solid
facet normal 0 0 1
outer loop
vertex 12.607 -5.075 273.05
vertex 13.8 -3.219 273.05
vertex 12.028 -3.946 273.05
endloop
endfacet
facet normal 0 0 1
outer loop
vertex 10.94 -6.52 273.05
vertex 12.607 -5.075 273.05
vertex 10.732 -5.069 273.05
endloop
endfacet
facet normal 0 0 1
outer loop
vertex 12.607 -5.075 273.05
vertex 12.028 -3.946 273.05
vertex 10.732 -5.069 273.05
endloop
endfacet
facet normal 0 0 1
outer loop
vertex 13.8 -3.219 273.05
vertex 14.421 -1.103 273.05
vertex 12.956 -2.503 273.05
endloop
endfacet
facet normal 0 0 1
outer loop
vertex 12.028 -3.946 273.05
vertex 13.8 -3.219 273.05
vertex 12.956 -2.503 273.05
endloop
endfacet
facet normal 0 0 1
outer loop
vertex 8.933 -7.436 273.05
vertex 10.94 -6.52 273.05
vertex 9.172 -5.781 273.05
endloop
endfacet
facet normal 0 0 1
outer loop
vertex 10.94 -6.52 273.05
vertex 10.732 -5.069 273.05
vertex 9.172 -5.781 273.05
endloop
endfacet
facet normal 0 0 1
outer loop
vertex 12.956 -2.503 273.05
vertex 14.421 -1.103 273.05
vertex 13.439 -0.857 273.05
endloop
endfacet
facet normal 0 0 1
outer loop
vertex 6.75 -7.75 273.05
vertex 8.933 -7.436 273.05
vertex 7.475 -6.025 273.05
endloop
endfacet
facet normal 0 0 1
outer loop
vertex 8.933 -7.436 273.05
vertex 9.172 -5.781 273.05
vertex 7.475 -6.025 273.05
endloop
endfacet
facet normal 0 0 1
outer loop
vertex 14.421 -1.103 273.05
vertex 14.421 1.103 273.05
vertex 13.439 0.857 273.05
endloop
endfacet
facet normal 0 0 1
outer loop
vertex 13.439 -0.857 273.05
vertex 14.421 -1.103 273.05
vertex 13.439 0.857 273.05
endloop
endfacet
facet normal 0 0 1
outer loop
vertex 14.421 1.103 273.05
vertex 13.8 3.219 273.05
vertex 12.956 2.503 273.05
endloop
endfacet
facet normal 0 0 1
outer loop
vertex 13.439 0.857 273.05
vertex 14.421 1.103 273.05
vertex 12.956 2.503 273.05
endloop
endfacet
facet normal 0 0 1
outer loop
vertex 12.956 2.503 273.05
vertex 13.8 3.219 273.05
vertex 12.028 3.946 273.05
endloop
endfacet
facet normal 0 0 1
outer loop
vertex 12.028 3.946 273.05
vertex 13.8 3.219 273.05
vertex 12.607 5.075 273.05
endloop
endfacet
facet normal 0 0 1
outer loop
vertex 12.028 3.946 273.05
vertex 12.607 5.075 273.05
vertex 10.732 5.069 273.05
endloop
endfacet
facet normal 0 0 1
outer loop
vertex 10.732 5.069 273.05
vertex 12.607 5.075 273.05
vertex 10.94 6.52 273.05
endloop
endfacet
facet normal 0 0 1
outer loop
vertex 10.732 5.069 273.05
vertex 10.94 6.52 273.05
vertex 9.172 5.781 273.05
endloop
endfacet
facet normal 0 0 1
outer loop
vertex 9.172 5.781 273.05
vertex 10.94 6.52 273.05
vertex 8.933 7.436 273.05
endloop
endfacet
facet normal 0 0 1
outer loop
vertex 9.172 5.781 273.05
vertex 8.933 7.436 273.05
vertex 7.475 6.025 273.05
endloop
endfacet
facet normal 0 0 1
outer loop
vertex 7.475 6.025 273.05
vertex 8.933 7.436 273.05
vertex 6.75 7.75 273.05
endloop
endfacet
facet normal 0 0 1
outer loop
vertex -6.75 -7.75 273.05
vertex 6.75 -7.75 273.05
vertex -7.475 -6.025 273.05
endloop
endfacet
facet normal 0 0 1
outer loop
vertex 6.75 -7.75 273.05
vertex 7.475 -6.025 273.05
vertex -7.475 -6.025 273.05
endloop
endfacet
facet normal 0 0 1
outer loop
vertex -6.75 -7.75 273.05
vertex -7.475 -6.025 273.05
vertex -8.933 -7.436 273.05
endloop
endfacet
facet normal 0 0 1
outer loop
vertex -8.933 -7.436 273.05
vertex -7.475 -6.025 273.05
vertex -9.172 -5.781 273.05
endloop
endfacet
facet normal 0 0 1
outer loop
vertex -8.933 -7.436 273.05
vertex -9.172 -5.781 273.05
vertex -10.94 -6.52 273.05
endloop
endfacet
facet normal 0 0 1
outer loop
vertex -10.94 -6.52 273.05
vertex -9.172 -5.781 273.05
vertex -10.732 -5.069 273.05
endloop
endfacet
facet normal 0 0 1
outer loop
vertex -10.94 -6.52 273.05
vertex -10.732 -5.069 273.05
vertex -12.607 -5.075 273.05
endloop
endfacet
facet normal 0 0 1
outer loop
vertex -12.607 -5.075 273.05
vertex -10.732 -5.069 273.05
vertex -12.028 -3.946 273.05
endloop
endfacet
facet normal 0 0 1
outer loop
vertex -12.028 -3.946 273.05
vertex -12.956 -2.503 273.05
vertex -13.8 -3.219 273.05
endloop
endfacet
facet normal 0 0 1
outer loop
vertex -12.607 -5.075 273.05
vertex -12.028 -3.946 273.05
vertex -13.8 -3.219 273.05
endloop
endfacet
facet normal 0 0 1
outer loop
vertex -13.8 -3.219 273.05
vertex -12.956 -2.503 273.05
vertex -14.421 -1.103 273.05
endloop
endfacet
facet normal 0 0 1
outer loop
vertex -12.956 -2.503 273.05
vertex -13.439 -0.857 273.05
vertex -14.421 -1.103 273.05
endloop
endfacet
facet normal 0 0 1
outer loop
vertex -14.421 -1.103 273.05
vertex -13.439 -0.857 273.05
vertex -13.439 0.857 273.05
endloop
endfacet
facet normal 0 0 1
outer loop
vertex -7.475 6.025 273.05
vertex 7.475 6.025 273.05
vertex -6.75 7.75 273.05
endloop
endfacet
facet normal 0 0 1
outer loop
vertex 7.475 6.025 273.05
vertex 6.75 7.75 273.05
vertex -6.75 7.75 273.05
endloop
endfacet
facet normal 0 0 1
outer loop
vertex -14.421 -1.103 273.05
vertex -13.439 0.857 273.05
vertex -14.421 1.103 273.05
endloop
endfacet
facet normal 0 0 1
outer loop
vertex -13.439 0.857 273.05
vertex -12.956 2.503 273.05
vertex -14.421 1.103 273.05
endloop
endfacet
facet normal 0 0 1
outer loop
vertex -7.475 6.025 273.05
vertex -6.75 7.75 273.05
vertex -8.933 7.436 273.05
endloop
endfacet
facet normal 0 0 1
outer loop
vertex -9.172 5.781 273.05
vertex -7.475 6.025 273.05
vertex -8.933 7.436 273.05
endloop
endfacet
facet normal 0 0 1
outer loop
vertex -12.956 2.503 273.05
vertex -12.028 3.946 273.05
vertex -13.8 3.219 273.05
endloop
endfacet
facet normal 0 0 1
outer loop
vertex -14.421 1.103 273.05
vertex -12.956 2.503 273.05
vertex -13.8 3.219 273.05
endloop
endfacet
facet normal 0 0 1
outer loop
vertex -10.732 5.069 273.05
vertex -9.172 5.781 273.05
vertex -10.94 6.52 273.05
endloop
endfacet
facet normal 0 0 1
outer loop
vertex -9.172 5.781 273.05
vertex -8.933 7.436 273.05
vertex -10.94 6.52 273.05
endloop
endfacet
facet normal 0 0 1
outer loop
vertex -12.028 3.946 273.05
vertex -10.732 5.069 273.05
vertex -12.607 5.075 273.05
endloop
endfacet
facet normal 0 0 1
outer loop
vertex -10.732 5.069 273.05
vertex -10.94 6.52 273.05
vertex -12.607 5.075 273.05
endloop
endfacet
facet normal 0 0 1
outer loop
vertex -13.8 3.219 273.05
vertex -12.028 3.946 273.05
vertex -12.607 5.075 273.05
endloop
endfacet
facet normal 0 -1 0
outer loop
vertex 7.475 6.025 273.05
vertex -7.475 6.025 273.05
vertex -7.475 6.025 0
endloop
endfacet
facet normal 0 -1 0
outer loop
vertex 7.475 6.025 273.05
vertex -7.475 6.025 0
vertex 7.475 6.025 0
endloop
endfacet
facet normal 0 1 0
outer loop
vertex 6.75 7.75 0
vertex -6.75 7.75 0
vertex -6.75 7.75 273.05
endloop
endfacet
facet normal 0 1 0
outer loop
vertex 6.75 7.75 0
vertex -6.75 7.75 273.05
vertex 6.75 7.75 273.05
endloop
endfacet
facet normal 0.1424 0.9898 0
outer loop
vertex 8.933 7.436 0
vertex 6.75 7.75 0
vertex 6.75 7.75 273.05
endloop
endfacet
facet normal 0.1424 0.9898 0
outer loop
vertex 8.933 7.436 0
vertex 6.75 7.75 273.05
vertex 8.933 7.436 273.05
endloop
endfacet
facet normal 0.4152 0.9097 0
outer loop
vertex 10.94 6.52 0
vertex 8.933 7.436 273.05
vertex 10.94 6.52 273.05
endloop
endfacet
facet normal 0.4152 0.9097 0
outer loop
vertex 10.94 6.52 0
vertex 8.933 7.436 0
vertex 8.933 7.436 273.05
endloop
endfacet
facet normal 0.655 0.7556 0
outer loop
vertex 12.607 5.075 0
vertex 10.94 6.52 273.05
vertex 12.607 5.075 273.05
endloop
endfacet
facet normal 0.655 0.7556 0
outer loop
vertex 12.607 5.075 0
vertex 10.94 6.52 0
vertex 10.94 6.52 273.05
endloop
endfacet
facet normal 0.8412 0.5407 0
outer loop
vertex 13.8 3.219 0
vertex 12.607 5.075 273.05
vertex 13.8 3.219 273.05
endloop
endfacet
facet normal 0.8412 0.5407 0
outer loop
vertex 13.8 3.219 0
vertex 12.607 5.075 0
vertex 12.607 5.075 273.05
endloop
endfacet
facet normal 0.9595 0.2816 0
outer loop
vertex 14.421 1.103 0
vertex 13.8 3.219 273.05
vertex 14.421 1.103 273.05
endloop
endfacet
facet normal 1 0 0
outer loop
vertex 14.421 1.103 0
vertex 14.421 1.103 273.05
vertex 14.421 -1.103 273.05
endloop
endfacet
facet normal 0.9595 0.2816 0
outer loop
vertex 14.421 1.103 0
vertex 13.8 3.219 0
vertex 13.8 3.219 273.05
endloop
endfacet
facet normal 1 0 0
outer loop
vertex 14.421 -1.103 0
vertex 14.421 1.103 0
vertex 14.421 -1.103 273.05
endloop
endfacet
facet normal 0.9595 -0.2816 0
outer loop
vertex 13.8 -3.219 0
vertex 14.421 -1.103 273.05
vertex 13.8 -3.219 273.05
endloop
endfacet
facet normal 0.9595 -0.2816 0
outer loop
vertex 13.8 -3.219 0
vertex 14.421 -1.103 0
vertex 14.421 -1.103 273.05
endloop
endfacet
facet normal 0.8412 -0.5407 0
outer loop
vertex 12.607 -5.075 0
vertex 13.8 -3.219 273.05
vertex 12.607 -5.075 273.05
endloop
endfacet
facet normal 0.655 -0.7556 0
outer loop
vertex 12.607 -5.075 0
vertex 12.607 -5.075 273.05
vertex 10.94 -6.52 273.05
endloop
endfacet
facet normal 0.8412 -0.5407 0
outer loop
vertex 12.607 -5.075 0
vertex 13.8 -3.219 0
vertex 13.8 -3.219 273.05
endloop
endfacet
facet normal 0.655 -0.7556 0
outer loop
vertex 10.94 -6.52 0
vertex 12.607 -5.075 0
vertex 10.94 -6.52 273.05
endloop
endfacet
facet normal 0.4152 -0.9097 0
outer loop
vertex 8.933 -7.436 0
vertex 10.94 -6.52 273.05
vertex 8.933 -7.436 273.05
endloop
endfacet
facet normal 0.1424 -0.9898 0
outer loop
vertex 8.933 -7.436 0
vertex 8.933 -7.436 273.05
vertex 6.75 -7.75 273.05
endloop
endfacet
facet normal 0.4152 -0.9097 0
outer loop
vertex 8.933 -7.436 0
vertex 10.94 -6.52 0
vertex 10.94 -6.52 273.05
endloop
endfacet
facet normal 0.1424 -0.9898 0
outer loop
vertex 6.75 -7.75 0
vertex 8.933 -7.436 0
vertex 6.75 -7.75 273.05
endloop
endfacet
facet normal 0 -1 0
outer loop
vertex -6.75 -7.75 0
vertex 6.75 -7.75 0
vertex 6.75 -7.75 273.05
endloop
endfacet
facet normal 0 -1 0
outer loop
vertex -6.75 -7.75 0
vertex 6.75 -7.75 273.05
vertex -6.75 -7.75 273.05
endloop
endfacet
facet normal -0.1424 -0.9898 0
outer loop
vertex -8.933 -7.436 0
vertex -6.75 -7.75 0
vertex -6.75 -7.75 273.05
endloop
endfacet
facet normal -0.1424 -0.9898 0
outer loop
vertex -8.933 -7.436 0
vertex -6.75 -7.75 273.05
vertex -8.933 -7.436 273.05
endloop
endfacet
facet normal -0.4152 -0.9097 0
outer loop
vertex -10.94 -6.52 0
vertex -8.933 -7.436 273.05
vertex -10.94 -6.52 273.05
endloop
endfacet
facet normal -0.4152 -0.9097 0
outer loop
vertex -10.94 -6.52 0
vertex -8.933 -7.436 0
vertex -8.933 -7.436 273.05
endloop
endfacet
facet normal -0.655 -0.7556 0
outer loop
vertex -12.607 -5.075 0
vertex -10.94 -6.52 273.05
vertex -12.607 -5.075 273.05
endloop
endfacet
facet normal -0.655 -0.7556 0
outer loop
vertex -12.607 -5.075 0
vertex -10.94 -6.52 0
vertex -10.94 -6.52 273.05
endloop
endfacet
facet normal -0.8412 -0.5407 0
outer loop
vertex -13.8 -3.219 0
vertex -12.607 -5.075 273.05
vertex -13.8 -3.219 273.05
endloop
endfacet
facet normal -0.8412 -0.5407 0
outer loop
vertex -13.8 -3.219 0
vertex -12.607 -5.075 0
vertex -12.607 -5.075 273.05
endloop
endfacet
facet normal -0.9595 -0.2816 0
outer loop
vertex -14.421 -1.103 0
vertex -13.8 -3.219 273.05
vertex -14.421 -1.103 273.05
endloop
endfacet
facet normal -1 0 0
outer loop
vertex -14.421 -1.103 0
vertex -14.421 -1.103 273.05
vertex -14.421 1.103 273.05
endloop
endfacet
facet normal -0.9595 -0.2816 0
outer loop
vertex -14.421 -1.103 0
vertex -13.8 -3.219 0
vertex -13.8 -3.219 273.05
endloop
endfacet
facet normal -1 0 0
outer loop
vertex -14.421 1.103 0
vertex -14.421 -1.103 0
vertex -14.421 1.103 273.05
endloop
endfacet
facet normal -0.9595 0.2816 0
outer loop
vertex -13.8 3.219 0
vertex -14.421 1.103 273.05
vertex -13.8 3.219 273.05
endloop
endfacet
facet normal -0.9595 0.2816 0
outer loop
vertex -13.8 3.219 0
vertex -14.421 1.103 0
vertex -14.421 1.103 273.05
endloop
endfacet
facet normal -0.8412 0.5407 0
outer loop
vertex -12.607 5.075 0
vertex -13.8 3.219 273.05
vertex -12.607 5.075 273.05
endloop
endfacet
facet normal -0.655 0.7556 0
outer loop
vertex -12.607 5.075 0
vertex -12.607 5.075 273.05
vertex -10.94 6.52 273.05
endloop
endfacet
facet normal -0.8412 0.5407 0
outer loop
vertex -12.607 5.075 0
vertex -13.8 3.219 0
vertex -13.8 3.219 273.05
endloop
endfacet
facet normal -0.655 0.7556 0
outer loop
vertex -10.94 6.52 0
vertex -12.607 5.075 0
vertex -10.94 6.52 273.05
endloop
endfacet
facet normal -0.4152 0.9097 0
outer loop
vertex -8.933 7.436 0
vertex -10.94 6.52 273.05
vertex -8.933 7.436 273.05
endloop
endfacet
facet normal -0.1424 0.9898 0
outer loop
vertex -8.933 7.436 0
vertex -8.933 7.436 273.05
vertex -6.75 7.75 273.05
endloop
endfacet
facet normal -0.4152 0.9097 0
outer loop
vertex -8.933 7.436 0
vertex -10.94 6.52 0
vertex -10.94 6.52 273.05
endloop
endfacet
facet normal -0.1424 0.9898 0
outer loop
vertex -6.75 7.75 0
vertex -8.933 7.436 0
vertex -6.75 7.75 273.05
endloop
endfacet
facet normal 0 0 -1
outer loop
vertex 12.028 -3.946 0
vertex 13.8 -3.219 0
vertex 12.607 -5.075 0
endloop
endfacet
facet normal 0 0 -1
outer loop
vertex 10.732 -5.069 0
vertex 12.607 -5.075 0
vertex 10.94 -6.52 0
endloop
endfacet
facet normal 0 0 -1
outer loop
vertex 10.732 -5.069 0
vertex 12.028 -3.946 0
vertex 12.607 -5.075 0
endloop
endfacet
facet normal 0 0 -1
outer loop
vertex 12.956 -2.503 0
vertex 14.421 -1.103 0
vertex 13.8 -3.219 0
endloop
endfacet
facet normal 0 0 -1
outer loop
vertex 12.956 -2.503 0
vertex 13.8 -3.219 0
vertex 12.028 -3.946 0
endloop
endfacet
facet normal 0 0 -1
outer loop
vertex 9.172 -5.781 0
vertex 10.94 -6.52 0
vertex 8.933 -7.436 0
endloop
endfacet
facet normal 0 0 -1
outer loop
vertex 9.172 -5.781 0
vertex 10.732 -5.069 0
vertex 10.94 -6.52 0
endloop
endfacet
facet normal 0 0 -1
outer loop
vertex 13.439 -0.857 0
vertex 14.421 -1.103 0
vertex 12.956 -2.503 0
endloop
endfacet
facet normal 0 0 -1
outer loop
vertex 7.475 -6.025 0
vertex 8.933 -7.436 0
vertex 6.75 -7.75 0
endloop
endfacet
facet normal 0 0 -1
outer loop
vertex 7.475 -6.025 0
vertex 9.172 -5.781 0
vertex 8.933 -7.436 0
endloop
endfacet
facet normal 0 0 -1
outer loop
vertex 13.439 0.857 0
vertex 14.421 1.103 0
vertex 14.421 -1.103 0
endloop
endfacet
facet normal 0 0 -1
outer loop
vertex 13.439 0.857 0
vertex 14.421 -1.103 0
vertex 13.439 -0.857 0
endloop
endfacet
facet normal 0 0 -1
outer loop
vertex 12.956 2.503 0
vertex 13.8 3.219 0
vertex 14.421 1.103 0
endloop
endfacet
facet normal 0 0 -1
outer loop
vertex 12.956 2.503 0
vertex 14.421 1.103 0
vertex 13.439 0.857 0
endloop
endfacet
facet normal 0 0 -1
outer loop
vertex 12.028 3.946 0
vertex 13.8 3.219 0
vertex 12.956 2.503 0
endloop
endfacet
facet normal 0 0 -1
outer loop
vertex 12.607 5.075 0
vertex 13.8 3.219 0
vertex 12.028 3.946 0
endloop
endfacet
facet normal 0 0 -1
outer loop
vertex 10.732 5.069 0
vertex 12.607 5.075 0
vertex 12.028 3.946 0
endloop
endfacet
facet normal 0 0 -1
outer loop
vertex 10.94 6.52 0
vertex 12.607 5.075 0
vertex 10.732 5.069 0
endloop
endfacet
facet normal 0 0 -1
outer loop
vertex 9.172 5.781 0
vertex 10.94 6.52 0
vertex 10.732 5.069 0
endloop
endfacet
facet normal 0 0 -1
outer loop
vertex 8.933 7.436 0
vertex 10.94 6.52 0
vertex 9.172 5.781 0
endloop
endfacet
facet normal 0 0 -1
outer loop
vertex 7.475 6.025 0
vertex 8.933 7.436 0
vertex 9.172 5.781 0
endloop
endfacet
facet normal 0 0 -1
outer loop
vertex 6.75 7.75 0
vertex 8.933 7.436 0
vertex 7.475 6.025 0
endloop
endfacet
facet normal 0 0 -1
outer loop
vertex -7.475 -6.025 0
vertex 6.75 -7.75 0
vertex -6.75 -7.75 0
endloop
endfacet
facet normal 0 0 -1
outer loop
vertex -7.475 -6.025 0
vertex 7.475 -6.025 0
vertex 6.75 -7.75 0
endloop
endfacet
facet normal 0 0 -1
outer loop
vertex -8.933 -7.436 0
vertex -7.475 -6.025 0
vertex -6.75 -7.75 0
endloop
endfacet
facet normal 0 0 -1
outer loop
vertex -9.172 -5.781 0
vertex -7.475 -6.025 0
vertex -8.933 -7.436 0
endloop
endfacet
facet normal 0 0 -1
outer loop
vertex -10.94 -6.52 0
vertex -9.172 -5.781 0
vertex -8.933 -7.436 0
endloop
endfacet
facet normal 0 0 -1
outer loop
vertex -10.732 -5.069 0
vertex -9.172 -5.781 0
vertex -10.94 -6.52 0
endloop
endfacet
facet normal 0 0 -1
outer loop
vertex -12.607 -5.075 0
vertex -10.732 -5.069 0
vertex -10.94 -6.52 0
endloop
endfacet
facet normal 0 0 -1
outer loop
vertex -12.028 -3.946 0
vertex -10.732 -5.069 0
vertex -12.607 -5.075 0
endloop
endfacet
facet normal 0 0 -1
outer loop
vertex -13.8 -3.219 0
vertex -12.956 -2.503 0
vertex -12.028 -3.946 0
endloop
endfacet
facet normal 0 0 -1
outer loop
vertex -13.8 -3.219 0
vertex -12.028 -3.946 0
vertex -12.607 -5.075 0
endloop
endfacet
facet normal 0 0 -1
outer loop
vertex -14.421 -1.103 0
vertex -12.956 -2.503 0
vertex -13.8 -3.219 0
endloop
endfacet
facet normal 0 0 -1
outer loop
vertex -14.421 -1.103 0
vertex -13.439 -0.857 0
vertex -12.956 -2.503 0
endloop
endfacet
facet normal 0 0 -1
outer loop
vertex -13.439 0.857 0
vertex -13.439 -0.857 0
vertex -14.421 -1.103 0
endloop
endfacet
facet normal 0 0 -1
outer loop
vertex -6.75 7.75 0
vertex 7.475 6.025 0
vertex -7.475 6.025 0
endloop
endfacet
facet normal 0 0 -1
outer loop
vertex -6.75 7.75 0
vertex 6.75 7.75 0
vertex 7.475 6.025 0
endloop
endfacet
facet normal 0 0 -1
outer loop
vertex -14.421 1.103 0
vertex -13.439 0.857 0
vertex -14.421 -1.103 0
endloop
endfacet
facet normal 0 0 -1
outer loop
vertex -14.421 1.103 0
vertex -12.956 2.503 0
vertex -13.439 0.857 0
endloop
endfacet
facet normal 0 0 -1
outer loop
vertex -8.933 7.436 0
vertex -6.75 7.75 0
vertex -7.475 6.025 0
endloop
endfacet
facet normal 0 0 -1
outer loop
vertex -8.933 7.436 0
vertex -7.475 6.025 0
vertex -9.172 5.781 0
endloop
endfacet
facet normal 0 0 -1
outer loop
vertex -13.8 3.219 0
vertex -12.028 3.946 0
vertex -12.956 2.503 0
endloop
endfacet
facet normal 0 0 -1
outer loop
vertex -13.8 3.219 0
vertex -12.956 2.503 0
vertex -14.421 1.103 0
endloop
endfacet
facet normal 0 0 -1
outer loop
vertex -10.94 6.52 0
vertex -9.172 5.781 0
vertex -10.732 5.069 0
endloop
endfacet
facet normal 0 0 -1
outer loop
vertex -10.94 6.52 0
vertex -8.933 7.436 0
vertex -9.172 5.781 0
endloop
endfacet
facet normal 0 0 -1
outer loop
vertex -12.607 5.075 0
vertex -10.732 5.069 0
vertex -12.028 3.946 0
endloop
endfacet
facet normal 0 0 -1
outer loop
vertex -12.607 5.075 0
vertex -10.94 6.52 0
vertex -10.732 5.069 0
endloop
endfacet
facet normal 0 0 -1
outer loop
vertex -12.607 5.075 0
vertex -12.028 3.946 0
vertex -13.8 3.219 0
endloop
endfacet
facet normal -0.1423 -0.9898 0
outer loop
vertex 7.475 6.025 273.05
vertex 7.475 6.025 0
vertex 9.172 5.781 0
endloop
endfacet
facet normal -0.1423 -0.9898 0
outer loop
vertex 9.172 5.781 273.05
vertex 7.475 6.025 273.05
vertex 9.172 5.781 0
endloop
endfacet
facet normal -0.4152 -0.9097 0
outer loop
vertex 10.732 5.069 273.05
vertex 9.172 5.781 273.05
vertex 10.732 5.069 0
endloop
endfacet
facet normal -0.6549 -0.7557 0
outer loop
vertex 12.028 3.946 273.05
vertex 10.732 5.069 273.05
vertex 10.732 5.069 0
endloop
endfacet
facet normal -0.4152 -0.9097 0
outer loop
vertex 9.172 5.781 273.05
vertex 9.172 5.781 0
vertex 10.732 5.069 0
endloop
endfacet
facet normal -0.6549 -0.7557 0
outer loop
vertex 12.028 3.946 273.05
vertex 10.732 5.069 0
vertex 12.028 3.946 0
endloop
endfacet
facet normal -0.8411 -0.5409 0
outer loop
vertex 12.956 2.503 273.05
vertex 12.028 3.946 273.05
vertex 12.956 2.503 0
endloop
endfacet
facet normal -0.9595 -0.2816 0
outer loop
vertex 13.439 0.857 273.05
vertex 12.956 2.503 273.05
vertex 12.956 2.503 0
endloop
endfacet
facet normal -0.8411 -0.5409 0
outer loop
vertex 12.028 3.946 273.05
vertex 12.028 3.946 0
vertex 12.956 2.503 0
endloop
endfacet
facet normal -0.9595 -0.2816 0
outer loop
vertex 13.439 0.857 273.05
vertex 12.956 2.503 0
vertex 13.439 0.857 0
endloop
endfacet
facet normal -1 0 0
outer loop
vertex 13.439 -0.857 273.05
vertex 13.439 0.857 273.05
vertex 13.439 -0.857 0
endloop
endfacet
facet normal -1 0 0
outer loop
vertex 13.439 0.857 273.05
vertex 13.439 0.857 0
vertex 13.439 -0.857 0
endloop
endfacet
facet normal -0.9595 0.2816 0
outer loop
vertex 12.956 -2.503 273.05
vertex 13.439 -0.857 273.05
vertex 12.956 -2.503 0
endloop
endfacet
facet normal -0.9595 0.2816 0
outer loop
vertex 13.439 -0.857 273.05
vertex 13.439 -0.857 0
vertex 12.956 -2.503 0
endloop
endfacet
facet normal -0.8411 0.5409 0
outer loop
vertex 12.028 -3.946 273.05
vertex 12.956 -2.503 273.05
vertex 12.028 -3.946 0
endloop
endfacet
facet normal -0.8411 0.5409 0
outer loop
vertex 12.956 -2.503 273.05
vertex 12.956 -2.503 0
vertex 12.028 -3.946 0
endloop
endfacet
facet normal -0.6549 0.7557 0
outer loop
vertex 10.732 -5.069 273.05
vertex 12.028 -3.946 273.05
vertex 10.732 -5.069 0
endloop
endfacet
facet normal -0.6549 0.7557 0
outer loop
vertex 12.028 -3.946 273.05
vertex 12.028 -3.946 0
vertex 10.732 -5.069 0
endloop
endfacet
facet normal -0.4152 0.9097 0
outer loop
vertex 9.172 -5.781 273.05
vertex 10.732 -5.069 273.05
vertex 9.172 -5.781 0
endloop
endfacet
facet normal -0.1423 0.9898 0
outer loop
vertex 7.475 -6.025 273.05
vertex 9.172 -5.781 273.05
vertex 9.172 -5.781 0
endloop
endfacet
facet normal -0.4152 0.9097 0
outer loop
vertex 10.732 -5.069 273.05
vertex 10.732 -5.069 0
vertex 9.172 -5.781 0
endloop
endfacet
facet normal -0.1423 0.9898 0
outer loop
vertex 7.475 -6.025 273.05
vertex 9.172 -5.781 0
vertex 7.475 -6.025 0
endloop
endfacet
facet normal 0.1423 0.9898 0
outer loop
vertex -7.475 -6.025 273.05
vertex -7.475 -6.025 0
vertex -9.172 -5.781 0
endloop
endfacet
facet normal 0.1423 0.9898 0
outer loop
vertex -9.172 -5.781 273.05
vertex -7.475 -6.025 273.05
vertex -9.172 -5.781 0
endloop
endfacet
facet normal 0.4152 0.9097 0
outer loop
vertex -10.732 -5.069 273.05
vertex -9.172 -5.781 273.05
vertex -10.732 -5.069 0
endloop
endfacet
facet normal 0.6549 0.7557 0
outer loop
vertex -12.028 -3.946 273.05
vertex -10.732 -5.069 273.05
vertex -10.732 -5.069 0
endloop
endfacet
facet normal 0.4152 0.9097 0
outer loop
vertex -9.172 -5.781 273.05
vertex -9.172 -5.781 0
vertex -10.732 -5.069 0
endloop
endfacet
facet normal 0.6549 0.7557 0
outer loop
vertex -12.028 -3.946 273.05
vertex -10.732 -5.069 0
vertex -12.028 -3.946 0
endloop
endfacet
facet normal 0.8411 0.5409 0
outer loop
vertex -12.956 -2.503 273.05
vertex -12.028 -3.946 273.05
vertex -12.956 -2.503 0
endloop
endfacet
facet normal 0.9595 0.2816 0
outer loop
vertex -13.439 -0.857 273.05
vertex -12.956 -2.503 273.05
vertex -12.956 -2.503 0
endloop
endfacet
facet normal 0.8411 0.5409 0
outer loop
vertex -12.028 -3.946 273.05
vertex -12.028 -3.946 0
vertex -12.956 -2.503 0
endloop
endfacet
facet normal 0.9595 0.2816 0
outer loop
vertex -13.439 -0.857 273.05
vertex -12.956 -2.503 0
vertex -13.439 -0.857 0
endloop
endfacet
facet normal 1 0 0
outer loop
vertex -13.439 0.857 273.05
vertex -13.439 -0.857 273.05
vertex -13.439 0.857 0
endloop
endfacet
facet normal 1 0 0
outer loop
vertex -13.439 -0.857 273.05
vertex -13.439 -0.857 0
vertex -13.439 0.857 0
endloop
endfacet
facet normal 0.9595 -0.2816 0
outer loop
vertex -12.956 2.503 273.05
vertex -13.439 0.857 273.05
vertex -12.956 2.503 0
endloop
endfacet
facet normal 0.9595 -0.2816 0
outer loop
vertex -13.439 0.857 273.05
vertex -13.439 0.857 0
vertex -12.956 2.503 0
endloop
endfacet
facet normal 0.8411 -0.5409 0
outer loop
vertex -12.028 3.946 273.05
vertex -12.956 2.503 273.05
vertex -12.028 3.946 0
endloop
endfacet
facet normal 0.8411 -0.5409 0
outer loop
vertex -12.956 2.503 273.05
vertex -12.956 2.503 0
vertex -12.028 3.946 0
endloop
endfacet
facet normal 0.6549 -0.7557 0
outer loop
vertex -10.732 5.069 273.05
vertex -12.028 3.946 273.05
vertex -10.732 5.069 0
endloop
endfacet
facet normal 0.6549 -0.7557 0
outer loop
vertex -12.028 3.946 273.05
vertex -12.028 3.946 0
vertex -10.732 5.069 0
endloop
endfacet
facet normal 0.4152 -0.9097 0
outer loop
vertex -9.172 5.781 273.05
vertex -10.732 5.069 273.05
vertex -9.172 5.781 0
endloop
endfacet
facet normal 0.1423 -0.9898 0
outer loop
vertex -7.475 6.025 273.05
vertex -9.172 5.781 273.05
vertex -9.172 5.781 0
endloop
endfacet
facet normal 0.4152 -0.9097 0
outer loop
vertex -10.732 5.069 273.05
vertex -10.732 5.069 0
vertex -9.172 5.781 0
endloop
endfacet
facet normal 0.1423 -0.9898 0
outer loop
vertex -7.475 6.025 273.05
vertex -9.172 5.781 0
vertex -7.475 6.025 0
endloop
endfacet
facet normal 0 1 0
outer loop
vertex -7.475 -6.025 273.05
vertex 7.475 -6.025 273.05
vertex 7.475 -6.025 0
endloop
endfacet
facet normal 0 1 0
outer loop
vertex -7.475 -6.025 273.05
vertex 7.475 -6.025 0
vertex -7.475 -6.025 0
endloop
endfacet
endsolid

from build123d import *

# Parameters (mm, degrees)
BOSS_EXTRUDE1_DEPTH     = 273.05
CUT_EXTRUDE1_DEPTH      = 274.544539335
CUT_EXTRUDE1_DEPTH_BACK = 274.544539335


with BuildPart() as part:
    # Sketch1 → Boss-Extrude1 (new body)
    with BuildSketch(Plane.XY):
        with BuildLine():
            Line((-6.75, 7.75), (6.75, 7.75))
            ThreePointArc((6.75, 7.75), (14.5, 0), (6.75, -7.75))
            Line((6.75, -7.75), (-6.75, -7.75))
            ThreePointArc((-6.75, -7.75), (-14.5, 0), (-6.75, 7.75))
        make_face()
    extrude(amount=BOSS_EXTRUDE1_DEPTH)

    # Sketch2 → Cut-Extrude1 (cut, two sides: drawn at the far end of the back side and taken through both)
    with BuildSketch(Plane.XY.offset(273.05).offset(-CUT_EXTRUDE1_DEPTH_BACK)):
        with BuildLine():
            Line((-7.475, 6.025), (7.475, 6.025))
            ThreePointArc((7.475, 6.025), (13.5, 0), (7.475, -6.025))
            Line((7.475, -6.025), (-7.475, -6.025))
            ThreePointArc((-7.475, -6.025), (-13.5, 0), (-7.475, 6.025))
        make_face()
    extrude(amount=CUT_EXTRUDE1_DEPTH + CUT_EXTRUDE1_DEPTH_BACK, mode=Mode.SUBTRACT)


solid = part.part
